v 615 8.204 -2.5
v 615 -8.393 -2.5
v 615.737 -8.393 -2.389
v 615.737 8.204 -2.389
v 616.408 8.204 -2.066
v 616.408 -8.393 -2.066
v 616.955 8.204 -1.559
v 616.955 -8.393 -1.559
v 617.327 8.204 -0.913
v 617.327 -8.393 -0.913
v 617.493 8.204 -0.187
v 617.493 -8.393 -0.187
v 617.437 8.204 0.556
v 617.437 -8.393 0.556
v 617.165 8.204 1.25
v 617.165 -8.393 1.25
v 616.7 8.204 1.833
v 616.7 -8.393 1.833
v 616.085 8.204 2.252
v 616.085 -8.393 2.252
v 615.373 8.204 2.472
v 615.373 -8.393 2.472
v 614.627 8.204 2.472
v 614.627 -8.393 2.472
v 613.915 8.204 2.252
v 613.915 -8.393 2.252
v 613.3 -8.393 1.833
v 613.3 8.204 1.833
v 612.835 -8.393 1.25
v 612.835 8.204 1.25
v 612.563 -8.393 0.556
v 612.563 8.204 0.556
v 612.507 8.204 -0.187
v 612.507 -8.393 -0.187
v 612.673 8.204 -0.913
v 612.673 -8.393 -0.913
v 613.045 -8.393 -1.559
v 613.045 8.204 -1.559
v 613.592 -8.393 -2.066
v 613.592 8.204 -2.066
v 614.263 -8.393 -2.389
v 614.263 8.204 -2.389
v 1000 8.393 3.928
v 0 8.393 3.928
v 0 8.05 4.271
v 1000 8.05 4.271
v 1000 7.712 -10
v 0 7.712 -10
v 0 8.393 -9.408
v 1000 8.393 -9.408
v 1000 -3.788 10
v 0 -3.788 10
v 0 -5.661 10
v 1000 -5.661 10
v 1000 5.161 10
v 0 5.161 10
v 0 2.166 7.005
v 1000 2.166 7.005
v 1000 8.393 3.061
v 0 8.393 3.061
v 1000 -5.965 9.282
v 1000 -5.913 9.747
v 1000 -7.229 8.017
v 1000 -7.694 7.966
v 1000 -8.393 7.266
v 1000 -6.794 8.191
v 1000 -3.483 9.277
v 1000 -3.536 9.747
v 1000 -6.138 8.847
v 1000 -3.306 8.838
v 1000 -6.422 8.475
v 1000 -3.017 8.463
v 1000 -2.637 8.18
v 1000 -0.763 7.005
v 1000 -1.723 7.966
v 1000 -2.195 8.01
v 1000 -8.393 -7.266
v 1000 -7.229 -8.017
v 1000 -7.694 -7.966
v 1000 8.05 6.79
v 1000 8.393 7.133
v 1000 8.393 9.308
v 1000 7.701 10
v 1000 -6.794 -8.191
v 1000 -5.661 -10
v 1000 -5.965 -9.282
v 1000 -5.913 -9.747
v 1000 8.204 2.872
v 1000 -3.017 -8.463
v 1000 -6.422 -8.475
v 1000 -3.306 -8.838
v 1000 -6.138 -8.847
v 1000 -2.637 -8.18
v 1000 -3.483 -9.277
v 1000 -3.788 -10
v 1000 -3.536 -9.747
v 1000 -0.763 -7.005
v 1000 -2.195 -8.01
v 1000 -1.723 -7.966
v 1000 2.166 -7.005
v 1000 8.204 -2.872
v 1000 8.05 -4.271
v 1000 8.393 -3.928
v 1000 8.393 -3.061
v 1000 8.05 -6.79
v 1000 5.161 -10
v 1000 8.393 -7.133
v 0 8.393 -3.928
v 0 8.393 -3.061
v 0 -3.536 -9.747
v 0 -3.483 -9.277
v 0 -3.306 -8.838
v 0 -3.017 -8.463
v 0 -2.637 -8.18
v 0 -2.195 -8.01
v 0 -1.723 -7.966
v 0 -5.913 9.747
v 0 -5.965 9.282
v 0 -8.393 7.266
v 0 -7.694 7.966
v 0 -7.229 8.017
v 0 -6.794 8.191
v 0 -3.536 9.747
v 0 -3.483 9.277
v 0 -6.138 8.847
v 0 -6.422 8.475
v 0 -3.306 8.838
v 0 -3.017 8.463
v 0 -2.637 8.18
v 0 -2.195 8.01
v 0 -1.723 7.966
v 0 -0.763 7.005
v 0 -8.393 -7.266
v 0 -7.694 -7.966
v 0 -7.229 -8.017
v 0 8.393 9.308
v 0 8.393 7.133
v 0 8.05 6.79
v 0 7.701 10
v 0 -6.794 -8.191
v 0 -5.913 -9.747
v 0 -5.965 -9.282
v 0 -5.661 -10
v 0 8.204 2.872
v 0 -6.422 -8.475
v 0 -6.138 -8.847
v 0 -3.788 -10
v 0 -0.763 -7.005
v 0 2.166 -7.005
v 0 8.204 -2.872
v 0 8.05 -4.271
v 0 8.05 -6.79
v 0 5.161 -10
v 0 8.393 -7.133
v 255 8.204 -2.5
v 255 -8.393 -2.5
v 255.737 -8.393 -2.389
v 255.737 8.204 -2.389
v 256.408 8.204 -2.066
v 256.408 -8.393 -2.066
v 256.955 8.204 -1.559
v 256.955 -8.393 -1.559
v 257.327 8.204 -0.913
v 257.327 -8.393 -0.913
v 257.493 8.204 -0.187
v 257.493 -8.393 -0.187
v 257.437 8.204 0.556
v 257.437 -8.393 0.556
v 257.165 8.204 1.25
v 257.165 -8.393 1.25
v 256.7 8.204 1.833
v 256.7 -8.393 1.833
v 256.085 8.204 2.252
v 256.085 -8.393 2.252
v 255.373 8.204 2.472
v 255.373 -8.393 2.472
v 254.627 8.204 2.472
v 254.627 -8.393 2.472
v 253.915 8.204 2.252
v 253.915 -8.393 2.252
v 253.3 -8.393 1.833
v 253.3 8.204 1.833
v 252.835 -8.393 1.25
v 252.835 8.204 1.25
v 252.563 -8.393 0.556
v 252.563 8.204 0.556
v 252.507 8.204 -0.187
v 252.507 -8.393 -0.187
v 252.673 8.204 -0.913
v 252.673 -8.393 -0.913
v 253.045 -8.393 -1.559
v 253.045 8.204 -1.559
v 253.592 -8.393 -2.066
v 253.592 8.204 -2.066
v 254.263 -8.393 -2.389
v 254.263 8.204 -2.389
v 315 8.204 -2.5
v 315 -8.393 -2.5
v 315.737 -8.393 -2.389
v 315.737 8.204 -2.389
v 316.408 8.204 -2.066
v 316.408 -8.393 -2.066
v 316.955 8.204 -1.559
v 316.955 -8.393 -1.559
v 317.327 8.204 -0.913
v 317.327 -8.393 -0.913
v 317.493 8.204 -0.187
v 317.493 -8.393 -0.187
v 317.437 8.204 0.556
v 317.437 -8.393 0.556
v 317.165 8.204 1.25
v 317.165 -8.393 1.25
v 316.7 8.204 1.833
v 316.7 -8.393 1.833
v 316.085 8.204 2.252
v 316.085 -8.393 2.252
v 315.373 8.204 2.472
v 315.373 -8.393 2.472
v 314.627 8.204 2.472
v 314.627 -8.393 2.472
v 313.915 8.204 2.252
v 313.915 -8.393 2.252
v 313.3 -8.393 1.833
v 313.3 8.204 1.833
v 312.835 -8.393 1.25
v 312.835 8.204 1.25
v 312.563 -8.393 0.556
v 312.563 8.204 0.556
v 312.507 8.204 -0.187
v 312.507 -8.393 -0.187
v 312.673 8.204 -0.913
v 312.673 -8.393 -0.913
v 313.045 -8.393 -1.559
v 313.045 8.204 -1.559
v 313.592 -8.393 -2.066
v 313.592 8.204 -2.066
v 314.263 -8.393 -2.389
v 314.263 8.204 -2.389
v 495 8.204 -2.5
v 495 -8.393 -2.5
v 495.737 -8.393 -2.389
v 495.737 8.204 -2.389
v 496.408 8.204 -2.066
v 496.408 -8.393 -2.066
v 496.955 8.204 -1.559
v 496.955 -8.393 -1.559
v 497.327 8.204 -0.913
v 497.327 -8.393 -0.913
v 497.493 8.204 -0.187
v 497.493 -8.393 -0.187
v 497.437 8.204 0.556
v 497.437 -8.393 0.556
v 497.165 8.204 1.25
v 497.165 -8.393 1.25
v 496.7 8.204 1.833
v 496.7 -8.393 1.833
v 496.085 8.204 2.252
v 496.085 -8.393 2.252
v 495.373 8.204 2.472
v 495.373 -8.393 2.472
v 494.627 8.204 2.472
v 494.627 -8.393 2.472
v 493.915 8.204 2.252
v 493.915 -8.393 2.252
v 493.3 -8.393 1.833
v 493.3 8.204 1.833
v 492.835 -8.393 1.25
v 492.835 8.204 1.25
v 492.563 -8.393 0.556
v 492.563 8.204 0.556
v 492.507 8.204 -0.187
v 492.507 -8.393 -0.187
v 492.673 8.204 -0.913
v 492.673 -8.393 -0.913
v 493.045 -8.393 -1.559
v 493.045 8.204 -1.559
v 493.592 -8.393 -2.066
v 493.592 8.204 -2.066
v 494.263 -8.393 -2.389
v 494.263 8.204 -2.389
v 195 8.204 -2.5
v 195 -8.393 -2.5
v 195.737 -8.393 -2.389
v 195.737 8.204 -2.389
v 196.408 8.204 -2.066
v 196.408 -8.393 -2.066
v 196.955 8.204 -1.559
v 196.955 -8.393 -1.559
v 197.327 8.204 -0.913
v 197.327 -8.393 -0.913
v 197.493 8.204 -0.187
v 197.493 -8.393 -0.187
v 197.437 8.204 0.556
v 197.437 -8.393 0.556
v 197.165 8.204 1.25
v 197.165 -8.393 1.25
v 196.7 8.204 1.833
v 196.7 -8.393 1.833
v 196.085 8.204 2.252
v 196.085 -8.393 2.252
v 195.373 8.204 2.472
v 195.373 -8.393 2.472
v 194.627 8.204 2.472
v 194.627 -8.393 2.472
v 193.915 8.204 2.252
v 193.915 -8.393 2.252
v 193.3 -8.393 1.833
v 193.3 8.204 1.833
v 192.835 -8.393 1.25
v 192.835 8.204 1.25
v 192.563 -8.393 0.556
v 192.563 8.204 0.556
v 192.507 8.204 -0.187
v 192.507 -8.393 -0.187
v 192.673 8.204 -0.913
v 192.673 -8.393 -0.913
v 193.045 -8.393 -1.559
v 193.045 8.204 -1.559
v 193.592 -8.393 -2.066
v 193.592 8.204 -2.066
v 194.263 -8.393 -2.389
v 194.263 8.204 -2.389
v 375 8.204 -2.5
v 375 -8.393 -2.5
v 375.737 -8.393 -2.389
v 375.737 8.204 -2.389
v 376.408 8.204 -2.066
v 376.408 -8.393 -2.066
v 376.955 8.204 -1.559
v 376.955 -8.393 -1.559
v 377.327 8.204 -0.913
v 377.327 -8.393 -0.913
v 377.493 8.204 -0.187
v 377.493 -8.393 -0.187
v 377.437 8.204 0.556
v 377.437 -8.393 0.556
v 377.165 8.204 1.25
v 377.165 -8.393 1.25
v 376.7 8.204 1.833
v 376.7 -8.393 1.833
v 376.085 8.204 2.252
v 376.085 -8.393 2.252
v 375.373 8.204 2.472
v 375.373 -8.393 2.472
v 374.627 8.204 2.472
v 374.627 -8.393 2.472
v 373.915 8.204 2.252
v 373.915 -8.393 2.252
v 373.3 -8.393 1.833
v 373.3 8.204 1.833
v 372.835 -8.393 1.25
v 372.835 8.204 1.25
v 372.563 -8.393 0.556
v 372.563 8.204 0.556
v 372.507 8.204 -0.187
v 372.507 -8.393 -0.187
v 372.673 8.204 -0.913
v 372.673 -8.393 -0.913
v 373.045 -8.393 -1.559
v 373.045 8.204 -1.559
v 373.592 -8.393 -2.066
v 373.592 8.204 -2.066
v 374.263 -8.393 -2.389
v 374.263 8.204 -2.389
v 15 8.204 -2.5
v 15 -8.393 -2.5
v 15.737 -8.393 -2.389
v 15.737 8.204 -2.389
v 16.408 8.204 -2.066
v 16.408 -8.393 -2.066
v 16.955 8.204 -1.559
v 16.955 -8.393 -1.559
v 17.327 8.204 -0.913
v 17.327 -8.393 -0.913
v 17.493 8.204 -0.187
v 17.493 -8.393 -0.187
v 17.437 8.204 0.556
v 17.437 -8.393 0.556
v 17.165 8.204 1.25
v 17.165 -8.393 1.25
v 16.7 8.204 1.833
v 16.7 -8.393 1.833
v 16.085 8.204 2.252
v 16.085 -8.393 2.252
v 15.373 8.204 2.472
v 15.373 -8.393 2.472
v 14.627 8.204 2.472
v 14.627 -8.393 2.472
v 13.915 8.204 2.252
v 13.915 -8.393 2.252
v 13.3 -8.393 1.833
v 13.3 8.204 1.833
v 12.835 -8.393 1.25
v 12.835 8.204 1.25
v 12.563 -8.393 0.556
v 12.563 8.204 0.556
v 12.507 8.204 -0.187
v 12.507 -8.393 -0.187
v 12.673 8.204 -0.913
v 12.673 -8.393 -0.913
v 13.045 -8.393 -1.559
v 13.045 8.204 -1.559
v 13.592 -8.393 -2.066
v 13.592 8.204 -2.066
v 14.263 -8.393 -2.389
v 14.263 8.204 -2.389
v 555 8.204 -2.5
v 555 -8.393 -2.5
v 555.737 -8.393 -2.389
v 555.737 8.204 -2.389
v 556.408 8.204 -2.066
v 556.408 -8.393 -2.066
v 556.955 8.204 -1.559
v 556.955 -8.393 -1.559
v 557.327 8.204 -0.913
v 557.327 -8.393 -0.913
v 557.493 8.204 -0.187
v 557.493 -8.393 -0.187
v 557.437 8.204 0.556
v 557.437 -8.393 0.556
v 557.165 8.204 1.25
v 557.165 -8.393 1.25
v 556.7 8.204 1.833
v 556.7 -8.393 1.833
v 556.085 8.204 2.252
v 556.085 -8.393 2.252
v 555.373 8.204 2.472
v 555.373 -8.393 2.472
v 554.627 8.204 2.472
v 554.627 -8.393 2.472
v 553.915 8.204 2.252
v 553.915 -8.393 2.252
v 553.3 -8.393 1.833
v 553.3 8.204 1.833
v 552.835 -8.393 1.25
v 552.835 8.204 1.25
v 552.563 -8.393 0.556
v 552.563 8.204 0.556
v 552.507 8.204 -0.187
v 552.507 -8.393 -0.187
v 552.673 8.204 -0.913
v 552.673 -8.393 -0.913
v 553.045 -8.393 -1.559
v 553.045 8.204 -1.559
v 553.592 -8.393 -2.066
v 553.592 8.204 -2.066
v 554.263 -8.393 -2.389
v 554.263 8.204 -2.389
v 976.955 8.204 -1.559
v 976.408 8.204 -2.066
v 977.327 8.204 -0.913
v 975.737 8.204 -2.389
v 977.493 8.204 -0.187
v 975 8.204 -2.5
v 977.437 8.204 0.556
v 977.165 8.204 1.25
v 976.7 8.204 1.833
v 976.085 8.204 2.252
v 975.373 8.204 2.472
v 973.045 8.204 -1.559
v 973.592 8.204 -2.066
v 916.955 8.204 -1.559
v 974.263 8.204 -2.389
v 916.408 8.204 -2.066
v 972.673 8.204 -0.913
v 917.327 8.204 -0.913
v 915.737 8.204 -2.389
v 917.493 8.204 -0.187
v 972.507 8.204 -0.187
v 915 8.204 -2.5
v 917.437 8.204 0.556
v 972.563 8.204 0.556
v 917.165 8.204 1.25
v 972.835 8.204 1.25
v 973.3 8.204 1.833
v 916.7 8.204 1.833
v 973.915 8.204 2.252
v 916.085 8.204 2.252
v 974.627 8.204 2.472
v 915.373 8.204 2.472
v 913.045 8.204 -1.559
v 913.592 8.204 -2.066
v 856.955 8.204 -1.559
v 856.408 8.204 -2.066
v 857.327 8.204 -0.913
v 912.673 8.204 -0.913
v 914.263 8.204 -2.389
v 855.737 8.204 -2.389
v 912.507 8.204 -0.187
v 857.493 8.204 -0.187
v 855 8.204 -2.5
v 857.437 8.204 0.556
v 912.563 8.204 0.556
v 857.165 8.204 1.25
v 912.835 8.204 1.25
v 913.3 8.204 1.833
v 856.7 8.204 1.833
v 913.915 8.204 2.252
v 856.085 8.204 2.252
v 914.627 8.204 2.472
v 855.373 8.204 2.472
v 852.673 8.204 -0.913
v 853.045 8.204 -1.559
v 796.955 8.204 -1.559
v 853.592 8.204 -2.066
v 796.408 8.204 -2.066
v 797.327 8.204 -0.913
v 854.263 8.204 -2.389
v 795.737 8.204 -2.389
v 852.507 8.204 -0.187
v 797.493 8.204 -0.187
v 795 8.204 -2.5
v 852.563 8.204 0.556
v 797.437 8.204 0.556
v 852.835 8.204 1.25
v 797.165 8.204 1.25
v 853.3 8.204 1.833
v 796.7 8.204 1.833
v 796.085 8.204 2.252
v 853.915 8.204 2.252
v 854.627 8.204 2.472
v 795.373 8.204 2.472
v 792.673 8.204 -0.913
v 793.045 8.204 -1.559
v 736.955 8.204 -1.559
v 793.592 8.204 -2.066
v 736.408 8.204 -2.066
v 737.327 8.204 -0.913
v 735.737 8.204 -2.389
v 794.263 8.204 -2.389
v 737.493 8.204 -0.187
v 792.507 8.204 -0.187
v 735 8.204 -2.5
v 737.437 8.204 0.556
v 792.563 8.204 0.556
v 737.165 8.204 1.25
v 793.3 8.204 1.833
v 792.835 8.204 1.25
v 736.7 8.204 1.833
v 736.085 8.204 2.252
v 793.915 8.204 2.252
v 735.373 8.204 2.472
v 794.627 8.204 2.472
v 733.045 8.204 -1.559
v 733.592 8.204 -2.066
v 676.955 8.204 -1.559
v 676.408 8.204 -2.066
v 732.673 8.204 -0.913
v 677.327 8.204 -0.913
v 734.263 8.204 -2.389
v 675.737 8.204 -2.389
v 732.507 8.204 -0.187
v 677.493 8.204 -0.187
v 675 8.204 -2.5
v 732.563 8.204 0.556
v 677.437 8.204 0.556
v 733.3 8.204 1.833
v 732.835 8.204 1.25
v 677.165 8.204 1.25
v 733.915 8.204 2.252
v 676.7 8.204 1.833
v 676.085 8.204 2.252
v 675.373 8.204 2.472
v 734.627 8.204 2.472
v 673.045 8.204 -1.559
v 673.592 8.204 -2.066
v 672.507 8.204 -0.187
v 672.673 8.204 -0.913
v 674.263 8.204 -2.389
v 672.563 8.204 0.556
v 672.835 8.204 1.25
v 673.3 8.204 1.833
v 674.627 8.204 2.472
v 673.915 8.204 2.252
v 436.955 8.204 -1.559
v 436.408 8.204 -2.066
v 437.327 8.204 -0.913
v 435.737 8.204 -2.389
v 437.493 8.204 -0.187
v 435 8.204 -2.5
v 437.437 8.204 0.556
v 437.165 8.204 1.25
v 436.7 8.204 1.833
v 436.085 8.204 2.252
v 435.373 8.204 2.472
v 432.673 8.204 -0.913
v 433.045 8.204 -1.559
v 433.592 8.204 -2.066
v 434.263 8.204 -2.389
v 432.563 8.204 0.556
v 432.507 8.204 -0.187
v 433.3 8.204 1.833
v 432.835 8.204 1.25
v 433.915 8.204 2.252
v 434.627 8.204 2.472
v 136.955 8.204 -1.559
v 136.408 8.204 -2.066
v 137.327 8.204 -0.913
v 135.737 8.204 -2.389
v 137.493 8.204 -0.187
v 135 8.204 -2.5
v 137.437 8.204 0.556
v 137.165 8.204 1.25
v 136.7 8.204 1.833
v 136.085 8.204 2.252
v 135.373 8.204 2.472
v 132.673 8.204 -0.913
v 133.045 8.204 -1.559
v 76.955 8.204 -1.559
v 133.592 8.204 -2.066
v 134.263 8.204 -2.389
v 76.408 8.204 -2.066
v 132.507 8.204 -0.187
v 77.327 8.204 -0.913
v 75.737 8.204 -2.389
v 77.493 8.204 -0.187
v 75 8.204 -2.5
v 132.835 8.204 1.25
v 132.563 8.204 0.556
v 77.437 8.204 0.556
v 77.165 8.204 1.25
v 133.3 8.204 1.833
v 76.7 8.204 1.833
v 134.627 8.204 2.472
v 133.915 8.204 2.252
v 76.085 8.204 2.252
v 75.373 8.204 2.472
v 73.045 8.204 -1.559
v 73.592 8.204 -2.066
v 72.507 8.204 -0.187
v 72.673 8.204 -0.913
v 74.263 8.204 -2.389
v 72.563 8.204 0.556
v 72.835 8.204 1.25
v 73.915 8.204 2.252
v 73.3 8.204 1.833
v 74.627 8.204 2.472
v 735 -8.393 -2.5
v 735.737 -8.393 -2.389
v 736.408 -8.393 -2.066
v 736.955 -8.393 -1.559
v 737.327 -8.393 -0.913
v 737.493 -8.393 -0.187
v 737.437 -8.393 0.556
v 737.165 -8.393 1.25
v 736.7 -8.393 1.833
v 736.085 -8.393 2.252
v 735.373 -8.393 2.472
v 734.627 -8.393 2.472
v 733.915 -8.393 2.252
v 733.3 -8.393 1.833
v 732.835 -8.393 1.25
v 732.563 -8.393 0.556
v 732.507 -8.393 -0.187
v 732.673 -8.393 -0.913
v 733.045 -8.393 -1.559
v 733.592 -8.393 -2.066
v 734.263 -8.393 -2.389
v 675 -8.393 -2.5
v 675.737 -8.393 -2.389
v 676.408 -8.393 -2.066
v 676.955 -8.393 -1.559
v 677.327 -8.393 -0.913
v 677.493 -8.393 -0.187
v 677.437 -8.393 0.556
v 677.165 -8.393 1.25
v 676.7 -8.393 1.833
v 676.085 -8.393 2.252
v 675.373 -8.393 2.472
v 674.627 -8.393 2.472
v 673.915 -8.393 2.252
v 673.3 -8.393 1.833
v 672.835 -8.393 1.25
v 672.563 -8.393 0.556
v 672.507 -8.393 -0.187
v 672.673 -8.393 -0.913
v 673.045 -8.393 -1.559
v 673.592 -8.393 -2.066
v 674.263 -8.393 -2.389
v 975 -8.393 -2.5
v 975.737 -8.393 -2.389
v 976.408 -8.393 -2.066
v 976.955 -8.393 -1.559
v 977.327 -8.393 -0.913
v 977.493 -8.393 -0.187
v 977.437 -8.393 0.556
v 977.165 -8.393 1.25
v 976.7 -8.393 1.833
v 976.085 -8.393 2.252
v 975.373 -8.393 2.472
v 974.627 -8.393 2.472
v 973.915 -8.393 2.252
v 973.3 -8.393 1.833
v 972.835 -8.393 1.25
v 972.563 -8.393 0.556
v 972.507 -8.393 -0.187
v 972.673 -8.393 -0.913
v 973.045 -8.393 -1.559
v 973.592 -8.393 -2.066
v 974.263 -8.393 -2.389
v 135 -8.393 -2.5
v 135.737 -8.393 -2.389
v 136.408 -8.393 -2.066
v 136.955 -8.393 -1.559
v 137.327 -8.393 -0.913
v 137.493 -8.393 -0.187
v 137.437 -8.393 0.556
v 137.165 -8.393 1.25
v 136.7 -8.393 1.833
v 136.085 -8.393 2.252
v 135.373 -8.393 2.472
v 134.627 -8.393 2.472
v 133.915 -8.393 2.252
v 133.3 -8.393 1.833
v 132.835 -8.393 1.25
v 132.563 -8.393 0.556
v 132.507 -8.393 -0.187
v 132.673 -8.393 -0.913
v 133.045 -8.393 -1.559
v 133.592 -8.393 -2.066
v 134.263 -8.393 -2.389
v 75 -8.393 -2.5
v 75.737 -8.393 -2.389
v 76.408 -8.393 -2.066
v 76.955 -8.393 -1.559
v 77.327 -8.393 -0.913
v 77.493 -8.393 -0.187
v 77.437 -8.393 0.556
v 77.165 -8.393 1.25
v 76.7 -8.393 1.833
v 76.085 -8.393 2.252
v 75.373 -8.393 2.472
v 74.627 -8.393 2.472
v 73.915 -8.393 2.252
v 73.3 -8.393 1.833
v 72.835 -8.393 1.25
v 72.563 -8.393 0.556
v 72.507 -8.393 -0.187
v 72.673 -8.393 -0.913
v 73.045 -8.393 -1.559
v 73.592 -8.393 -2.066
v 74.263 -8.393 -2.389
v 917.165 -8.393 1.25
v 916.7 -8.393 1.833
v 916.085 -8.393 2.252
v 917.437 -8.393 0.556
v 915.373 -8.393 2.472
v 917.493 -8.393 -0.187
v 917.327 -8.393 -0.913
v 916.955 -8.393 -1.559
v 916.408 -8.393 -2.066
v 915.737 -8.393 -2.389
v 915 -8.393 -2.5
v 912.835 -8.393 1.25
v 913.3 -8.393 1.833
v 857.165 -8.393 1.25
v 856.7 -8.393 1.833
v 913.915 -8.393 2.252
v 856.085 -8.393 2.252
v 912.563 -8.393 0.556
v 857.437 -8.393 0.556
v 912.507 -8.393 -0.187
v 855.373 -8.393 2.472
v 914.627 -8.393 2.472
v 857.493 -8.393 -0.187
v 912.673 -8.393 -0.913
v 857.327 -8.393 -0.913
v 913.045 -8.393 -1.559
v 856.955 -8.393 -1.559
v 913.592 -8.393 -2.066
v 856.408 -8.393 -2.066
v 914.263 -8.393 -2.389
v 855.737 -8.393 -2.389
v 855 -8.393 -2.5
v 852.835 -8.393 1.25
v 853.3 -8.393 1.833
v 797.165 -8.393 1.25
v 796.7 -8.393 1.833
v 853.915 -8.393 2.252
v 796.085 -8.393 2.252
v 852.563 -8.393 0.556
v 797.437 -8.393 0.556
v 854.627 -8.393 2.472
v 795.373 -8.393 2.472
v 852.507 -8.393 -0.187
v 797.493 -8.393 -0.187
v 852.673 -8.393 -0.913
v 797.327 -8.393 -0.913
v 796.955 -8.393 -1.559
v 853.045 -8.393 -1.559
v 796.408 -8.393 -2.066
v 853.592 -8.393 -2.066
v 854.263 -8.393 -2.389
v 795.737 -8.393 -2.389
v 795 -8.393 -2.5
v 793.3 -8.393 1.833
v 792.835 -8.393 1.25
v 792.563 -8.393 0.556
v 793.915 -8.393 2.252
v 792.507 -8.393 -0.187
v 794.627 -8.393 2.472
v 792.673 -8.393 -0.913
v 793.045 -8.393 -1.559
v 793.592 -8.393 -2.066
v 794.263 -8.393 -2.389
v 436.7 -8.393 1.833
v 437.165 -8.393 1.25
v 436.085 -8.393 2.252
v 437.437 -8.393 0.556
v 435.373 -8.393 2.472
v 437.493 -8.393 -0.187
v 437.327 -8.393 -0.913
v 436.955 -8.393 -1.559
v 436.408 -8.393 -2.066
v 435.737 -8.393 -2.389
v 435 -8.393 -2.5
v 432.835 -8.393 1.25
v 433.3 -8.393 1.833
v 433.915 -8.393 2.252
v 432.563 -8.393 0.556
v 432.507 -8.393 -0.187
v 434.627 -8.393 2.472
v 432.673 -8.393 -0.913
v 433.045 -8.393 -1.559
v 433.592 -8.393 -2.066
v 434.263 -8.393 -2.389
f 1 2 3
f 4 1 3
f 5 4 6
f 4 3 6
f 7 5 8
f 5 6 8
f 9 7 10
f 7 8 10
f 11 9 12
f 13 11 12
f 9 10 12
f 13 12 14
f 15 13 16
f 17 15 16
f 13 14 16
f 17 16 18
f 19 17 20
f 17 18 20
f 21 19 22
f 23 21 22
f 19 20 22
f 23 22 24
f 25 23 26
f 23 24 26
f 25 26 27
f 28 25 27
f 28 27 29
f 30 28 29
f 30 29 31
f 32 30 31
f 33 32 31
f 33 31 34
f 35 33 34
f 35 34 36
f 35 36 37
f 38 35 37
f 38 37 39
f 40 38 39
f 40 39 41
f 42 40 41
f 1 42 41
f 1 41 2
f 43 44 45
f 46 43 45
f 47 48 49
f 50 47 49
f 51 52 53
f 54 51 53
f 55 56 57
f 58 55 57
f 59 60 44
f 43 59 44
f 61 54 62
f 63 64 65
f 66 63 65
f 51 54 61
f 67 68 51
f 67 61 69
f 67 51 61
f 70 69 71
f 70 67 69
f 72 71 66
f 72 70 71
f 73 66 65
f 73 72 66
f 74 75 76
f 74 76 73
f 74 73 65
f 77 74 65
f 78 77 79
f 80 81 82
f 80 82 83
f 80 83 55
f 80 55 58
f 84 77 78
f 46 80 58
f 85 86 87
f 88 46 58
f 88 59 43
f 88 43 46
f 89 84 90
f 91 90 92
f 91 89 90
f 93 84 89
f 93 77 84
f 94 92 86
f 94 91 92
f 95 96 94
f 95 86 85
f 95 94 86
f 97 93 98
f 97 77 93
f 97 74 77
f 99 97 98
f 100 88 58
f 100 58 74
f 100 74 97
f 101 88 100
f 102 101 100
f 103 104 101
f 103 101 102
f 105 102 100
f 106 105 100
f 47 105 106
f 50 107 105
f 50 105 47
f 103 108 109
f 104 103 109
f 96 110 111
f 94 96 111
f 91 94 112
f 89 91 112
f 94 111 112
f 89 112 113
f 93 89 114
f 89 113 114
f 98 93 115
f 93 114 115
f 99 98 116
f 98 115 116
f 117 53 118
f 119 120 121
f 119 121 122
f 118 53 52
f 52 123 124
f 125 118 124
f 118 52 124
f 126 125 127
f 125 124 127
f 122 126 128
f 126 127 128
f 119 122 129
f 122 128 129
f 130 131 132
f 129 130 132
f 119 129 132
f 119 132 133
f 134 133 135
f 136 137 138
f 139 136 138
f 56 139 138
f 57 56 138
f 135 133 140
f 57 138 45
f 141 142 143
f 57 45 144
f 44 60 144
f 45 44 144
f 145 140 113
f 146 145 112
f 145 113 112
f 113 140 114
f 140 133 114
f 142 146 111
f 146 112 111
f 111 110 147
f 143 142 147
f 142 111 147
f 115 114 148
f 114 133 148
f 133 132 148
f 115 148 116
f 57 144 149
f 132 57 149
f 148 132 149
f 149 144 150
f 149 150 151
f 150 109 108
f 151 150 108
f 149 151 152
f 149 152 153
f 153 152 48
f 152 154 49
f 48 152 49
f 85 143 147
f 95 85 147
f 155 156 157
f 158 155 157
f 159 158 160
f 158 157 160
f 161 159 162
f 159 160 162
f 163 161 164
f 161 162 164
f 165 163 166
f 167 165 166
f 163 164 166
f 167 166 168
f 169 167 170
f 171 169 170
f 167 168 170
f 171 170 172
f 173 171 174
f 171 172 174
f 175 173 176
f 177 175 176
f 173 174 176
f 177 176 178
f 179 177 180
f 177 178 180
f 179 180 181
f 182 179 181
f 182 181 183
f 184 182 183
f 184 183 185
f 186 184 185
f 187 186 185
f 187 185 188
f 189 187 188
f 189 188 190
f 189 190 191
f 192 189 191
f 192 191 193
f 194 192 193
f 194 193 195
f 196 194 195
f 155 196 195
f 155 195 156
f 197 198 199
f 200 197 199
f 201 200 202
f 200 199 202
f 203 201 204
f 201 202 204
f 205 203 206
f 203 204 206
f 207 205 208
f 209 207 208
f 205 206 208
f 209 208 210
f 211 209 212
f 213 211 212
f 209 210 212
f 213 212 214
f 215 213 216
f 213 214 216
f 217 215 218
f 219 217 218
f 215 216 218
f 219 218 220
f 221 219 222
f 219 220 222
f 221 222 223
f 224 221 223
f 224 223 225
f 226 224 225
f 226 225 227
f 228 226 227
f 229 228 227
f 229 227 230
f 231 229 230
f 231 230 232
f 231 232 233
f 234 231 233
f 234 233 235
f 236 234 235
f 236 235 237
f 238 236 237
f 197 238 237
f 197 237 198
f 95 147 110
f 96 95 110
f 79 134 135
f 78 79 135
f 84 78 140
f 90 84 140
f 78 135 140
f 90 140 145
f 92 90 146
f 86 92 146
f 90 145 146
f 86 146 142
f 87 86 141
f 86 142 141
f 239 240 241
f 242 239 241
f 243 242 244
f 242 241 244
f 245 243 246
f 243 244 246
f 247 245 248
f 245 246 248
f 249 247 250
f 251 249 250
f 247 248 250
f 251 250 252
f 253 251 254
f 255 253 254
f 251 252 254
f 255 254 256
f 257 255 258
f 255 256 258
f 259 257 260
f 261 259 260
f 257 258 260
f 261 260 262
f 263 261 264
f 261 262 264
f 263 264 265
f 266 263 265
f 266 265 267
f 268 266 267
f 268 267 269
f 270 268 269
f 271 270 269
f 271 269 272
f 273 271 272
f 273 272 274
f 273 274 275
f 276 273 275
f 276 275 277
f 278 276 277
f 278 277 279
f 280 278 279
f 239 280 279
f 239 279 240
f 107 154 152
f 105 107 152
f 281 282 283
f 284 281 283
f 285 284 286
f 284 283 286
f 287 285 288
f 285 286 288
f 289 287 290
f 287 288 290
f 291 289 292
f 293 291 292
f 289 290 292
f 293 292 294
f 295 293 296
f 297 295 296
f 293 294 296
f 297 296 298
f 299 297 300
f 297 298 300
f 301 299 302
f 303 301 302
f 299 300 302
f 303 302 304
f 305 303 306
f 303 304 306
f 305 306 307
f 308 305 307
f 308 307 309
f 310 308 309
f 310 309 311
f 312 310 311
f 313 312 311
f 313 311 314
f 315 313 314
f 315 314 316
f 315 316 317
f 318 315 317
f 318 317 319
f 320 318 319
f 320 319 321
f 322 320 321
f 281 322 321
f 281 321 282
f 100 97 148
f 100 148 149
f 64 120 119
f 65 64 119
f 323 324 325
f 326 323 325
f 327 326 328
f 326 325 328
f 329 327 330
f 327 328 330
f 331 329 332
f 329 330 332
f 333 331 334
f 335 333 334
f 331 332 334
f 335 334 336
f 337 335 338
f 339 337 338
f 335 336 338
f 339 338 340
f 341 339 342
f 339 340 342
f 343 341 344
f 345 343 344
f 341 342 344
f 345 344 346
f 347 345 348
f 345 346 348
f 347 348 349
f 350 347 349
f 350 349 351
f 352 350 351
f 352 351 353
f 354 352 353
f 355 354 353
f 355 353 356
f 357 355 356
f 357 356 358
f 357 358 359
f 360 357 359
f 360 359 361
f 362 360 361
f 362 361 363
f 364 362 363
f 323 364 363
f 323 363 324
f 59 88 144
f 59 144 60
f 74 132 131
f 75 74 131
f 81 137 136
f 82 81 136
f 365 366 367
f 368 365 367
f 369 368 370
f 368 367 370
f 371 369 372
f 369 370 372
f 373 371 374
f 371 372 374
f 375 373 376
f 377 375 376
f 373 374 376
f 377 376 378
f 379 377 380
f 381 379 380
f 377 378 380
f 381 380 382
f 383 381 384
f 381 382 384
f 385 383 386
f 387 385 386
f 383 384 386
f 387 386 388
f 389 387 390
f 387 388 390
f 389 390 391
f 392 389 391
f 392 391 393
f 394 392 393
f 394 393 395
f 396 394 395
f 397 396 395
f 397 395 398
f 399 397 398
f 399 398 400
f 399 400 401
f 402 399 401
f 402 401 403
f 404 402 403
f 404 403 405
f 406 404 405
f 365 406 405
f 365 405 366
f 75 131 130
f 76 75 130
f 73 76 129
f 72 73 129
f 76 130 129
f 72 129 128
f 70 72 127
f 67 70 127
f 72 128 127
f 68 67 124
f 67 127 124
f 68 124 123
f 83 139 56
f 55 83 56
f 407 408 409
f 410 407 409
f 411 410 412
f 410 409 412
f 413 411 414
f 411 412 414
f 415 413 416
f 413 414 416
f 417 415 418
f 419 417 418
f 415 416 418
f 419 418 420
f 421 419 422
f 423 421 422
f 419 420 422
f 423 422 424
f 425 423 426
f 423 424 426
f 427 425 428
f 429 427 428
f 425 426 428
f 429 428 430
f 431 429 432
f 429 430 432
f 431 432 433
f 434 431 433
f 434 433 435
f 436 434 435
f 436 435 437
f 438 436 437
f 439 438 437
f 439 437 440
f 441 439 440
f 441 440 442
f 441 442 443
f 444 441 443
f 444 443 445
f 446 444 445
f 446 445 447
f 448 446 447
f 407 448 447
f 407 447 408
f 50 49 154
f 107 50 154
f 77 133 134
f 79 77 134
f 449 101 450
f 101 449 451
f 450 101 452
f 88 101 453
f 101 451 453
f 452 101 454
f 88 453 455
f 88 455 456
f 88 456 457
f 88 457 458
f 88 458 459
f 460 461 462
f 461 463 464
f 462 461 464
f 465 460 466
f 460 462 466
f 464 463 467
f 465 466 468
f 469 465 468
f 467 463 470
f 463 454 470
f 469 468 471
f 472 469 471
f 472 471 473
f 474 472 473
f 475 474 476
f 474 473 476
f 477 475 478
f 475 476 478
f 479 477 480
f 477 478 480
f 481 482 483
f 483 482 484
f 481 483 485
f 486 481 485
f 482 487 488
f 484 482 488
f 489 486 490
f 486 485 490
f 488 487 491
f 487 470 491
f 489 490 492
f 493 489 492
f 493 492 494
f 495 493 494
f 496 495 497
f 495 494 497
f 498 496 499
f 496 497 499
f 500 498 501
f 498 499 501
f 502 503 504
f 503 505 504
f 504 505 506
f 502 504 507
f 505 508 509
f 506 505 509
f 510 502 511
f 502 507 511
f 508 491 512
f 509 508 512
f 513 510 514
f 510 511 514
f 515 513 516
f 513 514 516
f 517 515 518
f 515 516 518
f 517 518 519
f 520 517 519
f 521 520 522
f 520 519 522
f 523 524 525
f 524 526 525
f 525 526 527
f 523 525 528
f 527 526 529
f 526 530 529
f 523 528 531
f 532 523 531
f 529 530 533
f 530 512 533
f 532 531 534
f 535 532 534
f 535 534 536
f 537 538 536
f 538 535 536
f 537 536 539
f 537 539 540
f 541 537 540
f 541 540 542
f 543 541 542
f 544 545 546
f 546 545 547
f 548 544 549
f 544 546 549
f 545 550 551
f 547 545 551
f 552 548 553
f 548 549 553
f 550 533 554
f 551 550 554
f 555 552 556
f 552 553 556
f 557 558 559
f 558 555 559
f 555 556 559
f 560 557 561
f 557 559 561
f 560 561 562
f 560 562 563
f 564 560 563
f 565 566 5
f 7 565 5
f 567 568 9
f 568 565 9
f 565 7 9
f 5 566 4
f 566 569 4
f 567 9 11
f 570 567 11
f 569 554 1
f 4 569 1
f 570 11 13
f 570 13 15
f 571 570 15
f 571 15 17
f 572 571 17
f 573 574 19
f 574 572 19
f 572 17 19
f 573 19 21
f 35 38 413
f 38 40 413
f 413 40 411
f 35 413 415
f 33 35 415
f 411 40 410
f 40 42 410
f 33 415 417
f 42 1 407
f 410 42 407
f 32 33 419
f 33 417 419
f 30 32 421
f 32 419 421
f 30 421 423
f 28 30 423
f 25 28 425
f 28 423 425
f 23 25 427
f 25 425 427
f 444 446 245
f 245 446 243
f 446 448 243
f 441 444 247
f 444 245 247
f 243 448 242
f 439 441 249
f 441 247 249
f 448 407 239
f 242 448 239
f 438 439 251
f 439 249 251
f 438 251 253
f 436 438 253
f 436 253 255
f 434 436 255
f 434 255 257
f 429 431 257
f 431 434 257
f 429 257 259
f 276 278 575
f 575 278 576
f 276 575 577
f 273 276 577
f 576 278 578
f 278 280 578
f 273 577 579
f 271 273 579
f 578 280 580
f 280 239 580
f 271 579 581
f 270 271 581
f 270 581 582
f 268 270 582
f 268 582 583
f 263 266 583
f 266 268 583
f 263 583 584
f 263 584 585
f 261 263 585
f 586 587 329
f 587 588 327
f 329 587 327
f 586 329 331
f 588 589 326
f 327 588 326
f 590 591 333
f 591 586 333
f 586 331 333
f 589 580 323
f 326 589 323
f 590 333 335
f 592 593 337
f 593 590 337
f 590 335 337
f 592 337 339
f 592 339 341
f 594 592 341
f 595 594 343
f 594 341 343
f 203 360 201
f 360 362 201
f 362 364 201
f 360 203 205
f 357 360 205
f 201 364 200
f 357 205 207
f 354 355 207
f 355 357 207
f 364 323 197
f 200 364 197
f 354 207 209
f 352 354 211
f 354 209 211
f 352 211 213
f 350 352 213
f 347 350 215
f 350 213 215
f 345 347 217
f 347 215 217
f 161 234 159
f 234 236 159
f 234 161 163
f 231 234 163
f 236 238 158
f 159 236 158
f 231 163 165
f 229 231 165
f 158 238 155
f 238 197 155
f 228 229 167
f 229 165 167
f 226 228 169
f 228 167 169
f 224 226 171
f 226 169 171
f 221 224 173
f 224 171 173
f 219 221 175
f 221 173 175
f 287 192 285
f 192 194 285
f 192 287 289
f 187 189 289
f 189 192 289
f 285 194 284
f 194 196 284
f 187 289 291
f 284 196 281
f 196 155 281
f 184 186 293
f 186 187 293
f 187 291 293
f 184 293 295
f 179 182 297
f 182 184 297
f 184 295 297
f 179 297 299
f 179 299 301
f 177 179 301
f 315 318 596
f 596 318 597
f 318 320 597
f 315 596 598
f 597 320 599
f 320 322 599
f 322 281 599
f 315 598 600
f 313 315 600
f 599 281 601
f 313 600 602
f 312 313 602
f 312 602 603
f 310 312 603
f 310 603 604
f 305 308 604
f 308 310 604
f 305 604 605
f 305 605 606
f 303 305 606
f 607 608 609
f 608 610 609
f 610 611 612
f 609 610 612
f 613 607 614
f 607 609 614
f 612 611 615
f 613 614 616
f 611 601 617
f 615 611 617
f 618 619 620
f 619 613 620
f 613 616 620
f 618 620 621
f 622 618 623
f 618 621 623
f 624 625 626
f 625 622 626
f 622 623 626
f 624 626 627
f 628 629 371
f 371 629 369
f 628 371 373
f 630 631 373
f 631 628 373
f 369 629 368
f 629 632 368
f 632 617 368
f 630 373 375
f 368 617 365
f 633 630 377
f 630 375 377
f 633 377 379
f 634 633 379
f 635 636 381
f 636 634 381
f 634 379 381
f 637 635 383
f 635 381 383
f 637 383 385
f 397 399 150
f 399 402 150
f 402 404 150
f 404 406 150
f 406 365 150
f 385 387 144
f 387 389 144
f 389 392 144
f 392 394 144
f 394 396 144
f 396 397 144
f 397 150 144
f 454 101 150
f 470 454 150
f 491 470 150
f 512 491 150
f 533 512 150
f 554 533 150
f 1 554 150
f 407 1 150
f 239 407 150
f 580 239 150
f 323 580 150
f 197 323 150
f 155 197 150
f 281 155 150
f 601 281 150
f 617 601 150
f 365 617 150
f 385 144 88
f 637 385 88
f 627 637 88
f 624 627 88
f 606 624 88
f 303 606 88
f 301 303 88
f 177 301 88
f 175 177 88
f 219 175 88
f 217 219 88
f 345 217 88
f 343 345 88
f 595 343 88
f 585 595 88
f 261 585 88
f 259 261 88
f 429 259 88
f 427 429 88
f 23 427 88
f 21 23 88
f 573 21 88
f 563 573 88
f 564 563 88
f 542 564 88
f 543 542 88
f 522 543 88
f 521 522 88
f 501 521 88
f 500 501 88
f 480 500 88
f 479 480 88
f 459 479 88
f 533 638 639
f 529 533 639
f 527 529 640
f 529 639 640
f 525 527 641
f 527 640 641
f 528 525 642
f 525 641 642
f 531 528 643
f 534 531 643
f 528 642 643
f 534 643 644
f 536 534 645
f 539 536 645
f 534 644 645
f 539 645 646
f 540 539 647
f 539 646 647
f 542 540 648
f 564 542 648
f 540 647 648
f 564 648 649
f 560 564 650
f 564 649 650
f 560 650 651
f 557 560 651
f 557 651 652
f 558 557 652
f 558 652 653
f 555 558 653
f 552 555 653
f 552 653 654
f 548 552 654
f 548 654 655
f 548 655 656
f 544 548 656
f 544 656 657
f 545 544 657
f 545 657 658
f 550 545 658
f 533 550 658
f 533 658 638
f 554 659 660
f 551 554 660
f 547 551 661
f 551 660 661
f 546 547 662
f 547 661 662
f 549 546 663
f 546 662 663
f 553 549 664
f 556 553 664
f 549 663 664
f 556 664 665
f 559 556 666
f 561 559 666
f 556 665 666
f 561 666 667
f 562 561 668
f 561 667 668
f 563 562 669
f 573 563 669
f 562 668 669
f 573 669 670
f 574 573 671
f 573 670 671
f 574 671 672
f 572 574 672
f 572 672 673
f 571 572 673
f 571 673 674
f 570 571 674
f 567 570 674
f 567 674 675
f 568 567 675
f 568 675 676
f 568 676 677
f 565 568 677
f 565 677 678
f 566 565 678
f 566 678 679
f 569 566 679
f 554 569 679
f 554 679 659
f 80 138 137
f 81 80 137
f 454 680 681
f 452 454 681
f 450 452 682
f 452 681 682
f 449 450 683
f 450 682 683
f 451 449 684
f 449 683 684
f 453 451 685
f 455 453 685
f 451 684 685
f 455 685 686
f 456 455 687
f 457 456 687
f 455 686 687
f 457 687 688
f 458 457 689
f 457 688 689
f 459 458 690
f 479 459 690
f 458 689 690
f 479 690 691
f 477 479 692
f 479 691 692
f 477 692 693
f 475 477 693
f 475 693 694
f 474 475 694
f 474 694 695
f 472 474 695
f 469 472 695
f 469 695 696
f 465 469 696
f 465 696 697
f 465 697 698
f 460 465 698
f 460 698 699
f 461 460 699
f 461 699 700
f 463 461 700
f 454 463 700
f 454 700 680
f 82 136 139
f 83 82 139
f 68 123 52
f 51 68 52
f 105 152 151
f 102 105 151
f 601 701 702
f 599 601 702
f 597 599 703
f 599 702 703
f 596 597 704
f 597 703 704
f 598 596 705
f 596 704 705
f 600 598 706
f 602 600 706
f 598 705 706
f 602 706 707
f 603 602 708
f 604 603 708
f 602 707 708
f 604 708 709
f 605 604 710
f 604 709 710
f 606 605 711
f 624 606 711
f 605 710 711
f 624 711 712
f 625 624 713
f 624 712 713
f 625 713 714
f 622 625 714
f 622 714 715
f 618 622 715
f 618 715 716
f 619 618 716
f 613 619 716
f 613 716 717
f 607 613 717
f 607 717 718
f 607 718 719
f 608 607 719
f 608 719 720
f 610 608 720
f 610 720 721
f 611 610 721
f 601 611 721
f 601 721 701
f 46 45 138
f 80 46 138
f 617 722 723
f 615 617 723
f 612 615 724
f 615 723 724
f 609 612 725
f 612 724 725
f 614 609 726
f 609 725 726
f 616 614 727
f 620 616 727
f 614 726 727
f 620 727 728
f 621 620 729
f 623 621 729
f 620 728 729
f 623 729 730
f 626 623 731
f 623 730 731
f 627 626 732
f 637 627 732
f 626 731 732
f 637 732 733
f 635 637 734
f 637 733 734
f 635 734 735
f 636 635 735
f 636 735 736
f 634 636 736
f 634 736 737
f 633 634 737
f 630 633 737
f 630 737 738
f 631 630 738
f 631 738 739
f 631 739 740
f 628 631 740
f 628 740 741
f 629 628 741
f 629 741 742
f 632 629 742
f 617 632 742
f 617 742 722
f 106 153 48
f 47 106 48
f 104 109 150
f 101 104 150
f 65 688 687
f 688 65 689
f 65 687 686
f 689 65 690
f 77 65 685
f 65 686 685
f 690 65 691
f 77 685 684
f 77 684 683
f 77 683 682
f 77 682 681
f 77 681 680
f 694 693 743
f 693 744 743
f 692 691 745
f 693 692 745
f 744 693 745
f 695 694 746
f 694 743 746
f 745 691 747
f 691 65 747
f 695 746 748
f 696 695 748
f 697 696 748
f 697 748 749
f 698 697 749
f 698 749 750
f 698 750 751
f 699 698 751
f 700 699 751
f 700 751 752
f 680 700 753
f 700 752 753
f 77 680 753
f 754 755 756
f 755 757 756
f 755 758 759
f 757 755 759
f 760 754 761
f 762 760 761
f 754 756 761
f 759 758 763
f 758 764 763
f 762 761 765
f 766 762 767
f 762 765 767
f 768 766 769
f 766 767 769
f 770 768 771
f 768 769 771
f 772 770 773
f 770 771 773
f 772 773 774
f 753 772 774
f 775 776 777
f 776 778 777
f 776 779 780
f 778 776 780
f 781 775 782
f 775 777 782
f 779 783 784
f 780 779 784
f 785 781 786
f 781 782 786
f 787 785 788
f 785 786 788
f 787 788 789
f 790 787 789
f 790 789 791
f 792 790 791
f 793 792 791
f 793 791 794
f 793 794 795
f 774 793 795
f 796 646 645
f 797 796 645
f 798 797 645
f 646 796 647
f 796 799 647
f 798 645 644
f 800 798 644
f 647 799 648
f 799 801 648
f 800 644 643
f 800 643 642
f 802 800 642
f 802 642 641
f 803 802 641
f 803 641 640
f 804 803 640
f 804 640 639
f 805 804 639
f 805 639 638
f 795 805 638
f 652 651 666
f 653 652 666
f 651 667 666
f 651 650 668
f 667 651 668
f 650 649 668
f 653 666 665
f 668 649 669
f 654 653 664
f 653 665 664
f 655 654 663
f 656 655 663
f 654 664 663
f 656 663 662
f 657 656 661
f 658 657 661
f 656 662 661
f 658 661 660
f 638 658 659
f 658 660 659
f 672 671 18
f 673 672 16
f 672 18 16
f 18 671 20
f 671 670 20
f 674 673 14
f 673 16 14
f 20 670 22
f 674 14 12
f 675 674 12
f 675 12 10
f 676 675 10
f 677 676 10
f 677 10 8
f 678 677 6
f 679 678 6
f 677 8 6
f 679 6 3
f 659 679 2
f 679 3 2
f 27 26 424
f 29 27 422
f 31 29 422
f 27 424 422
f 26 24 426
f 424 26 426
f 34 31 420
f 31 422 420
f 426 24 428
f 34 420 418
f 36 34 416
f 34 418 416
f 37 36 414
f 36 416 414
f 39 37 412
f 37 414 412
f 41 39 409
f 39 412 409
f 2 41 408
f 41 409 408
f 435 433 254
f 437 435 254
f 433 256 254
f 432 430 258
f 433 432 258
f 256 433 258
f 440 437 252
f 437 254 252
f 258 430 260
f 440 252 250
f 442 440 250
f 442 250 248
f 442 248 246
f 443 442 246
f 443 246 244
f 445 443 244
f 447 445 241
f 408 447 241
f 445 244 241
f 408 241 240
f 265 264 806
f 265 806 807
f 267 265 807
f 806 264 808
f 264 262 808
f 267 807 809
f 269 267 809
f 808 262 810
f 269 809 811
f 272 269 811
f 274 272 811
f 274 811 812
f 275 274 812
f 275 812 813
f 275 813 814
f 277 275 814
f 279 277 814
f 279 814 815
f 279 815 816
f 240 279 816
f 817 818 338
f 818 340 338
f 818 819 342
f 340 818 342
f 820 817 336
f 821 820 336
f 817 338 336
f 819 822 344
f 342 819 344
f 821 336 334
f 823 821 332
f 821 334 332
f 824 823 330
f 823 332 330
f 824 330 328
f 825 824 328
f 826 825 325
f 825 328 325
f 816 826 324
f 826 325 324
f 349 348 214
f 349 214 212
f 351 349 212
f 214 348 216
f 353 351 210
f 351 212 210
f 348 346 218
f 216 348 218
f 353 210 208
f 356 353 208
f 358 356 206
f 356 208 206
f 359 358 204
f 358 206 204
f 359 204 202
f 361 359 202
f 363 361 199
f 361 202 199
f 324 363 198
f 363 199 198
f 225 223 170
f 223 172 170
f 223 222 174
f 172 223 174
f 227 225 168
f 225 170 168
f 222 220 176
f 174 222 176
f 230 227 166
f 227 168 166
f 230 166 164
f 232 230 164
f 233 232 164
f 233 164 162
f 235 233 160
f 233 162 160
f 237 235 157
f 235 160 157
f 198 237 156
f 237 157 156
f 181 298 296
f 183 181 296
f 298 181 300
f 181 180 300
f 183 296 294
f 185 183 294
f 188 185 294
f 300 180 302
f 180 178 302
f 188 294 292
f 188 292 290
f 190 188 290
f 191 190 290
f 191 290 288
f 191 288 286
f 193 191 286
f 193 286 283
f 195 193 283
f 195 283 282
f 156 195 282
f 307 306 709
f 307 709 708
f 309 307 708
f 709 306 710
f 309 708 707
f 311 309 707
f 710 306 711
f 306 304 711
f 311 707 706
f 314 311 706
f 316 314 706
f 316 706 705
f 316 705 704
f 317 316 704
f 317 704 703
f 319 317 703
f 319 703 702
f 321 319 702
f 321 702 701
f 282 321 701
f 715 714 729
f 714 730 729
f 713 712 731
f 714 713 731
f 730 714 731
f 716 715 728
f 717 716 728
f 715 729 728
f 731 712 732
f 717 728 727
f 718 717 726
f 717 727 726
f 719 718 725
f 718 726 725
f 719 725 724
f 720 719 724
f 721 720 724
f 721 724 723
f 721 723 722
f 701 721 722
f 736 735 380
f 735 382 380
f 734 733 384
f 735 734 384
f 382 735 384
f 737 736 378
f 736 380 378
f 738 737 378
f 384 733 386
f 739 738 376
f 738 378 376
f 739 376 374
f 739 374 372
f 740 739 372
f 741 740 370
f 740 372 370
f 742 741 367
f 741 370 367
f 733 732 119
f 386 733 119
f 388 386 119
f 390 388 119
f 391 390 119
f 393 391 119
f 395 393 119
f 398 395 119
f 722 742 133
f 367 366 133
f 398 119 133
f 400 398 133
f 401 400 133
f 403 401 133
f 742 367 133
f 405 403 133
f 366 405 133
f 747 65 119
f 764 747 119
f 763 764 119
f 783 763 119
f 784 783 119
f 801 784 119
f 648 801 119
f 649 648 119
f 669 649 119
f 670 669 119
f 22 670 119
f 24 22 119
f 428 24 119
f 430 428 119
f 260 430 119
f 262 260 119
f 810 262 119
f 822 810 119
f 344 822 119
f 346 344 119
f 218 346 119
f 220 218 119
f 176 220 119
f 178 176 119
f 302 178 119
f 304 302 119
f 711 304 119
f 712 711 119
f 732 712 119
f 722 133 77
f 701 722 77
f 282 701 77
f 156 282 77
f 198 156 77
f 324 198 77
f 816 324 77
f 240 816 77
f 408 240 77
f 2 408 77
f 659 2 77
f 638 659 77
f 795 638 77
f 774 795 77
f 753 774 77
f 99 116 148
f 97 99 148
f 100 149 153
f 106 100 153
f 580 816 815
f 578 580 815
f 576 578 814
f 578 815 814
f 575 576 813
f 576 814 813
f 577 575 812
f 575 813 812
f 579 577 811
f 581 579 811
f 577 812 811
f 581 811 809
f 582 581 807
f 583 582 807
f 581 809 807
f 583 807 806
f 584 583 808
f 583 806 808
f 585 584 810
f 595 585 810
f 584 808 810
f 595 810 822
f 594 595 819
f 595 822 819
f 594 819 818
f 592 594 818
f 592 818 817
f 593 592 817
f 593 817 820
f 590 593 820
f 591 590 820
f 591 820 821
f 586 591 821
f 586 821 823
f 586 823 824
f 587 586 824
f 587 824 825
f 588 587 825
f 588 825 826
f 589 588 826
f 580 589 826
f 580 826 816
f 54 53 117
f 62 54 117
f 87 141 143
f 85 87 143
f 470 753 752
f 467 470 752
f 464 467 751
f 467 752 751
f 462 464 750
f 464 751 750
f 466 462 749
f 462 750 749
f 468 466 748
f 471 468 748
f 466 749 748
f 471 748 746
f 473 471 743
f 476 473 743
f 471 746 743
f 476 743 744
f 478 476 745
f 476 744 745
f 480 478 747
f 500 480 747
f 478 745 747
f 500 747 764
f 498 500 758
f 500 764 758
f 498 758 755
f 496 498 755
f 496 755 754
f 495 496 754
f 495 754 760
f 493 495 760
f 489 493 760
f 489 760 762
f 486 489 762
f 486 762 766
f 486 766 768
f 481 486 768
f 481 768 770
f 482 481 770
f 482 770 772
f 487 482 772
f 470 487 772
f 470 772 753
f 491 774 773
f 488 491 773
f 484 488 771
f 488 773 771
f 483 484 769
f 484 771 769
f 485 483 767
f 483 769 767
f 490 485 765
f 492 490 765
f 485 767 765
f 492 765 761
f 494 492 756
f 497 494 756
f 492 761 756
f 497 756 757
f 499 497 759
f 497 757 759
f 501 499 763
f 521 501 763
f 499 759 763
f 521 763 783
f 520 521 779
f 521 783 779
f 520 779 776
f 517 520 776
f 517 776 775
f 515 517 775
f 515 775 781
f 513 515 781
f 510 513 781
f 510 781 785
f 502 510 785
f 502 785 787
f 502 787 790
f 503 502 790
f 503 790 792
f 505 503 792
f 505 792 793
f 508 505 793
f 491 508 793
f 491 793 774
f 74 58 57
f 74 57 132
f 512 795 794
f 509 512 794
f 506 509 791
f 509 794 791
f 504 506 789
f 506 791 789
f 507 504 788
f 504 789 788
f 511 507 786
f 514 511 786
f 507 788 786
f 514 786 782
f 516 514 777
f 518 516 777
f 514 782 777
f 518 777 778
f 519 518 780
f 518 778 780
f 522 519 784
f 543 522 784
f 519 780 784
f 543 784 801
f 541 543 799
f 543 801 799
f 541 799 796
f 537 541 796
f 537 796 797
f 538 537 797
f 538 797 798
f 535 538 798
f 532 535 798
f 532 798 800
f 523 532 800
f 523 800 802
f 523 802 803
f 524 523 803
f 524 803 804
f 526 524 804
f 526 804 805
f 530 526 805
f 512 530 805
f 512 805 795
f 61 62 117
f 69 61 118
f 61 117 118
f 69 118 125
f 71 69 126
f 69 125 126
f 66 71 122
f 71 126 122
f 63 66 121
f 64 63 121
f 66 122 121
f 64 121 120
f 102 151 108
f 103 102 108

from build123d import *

# Parameters (mm, degrees)
BOSS_EXTRUDE1_DEPTH   = 1000
CROQUIS1_R            = 2.5
CORTAR_EXTRUIR1_DEPTH = 1001.190882073
MATRIZL1_COUNT        = 17
MATRIZL1_PITCH        = 60


with BuildPart() as part:
    # Sketch1 → Boss-Extrude1 (new body)
    with BuildSketch(Plane(origin=(0, 0, 0), x_dir=(0, 0, -1), z_dir=(1, 0, 0))):
        with BuildLine():
            Line((-7.965754986, -7.693975449), (-7.266272068, -8.393458366))
            Line((-7.266272068, -8.393458366), (7.266272068, -8.393458366))
            Line((7.266272068, -8.393458366), (7.965754986, -7.693975449))
            ThreePointArc((7.965754986, -7.693975449), (8.474723757, -6.421557866), (9.747437917, -5.913331162))
            Line((9.747437917, -5.913331162), (10.000000437, -5.660768637))
            Line((10.000000437, -5.660768637), (10.000000437, -3.788406023))
            Line((10.000000437, -3.788406023), (9.747437912, -3.535843503))
            ThreePointArc((9.747437912, -3.535843503), (8.462742055, -3.016656911), (7.965755402, -1.72321096))
            Line((7.965755402, -1.72321096), (7.005148341, -0.762603918))
            Line((7.005148341, -0.762603918), (7.005148341, 2.166206023))
            Line((7.005148341, 2.166206023), (10.000000347, 5.161058089))
            Line((10.000000347, 5.161058089), (10.000000347, 7.712387211))
            Line((10.000000347, 7.712387211), (9.408464779, 8.393458268))
            Line((9.408464779, 8.393458268), (7.133016457, 8.393458268))
            Line((7.133016457, 8.393458268), (6.789534443, 8.049976247))
            Line((6.789534443, 8.049976247), (4.271139656, 8.049976247))
            Line((4.271139656, 8.049976247), (3.927707784, 8.393458265))
            Line((3.927707784, 8.393458265), (3.061282509, 8.393458265))
            Line((3.061282509, 8.393458265), (2.872049327, 8.204225079))
            Line((2.872049327, 8.204225079), (-2.87204886, 8.204225079))
            Line((-2.87204886, 8.204225079), (-3.061282046, 8.393458261))
            Line((-3.061282046, 8.393458261), (-3.927707321, 8.393458261))
            Line((-3.927707321, 8.393458261), (-4.271189216, 8.049976359))
            Line((-4.271189216, 8.049976359), (-6.789534095, 8.049976359))
            Line((-6.789534095, 8.049976359), (-7.133016116, 8.393458373))
            Line((-7.133016116, 8.393458373), (-9.30771733, 8.393458373))
            Line((-9.30771733, 8.393458373), (-10, 7.70117569))
            Line((-10, 7.70117569), (-10, 5.161058187))
            Line((-10, 5.161058187), (-7.005147934, 2.166206181))
            Line((-7.005147934, 2.166206181), (-7.005147934, -0.76260376))
            Line((-7.005147934, -0.76260376), (-7.965754986, -1.723210812))
            ThreePointArc((-7.965754986, -1.723210812), (-8.462741848, -3.016656549), (-9.747437477, -3.535843372))
            Line((-9.747437477, -3.535843372), (-10, -3.788405895))
            Line((-10, -3.788405895), (-10, -5.660768509))
            Line((-10, -5.660768509), (-9.747437477, -5.913331032))
            ThreePointArc((-9.747437477, -5.913331032), (-8.474723558, -6.421557943), (-7.965754986, -7.693975449))
        make_face()
    extrude(amount=BOSS_EXTRUDE1_DEPTH)

    # Croquis1 → Cortar-Extruir1 (cut, through all)
    with BuildSketch(Plane(origin=(0, -8.393458366, 0), x_dir=(-1, 0, 0), z_dir=(0, -1, 0))):
        with Locations(Location((-15, 0, 0), (0, 0, 90))):
            Circle(CROQUIS1_R)
    cortar_extruir1 = extrude(amount=-CORTAR_EXTRUIR1_DEPTH, mode=Mode.SUBTRACT)

    # MatrizL1: Cortar-Extruir1 ×17
    with Locations(*[(i * MATRIZL1_PITCH, 0, 0) for i in range(1, MATRIZL1_COUNT)]):
        add(cortar_extruir1, mode=Mode.SUBTRACT)


solid = part.part
